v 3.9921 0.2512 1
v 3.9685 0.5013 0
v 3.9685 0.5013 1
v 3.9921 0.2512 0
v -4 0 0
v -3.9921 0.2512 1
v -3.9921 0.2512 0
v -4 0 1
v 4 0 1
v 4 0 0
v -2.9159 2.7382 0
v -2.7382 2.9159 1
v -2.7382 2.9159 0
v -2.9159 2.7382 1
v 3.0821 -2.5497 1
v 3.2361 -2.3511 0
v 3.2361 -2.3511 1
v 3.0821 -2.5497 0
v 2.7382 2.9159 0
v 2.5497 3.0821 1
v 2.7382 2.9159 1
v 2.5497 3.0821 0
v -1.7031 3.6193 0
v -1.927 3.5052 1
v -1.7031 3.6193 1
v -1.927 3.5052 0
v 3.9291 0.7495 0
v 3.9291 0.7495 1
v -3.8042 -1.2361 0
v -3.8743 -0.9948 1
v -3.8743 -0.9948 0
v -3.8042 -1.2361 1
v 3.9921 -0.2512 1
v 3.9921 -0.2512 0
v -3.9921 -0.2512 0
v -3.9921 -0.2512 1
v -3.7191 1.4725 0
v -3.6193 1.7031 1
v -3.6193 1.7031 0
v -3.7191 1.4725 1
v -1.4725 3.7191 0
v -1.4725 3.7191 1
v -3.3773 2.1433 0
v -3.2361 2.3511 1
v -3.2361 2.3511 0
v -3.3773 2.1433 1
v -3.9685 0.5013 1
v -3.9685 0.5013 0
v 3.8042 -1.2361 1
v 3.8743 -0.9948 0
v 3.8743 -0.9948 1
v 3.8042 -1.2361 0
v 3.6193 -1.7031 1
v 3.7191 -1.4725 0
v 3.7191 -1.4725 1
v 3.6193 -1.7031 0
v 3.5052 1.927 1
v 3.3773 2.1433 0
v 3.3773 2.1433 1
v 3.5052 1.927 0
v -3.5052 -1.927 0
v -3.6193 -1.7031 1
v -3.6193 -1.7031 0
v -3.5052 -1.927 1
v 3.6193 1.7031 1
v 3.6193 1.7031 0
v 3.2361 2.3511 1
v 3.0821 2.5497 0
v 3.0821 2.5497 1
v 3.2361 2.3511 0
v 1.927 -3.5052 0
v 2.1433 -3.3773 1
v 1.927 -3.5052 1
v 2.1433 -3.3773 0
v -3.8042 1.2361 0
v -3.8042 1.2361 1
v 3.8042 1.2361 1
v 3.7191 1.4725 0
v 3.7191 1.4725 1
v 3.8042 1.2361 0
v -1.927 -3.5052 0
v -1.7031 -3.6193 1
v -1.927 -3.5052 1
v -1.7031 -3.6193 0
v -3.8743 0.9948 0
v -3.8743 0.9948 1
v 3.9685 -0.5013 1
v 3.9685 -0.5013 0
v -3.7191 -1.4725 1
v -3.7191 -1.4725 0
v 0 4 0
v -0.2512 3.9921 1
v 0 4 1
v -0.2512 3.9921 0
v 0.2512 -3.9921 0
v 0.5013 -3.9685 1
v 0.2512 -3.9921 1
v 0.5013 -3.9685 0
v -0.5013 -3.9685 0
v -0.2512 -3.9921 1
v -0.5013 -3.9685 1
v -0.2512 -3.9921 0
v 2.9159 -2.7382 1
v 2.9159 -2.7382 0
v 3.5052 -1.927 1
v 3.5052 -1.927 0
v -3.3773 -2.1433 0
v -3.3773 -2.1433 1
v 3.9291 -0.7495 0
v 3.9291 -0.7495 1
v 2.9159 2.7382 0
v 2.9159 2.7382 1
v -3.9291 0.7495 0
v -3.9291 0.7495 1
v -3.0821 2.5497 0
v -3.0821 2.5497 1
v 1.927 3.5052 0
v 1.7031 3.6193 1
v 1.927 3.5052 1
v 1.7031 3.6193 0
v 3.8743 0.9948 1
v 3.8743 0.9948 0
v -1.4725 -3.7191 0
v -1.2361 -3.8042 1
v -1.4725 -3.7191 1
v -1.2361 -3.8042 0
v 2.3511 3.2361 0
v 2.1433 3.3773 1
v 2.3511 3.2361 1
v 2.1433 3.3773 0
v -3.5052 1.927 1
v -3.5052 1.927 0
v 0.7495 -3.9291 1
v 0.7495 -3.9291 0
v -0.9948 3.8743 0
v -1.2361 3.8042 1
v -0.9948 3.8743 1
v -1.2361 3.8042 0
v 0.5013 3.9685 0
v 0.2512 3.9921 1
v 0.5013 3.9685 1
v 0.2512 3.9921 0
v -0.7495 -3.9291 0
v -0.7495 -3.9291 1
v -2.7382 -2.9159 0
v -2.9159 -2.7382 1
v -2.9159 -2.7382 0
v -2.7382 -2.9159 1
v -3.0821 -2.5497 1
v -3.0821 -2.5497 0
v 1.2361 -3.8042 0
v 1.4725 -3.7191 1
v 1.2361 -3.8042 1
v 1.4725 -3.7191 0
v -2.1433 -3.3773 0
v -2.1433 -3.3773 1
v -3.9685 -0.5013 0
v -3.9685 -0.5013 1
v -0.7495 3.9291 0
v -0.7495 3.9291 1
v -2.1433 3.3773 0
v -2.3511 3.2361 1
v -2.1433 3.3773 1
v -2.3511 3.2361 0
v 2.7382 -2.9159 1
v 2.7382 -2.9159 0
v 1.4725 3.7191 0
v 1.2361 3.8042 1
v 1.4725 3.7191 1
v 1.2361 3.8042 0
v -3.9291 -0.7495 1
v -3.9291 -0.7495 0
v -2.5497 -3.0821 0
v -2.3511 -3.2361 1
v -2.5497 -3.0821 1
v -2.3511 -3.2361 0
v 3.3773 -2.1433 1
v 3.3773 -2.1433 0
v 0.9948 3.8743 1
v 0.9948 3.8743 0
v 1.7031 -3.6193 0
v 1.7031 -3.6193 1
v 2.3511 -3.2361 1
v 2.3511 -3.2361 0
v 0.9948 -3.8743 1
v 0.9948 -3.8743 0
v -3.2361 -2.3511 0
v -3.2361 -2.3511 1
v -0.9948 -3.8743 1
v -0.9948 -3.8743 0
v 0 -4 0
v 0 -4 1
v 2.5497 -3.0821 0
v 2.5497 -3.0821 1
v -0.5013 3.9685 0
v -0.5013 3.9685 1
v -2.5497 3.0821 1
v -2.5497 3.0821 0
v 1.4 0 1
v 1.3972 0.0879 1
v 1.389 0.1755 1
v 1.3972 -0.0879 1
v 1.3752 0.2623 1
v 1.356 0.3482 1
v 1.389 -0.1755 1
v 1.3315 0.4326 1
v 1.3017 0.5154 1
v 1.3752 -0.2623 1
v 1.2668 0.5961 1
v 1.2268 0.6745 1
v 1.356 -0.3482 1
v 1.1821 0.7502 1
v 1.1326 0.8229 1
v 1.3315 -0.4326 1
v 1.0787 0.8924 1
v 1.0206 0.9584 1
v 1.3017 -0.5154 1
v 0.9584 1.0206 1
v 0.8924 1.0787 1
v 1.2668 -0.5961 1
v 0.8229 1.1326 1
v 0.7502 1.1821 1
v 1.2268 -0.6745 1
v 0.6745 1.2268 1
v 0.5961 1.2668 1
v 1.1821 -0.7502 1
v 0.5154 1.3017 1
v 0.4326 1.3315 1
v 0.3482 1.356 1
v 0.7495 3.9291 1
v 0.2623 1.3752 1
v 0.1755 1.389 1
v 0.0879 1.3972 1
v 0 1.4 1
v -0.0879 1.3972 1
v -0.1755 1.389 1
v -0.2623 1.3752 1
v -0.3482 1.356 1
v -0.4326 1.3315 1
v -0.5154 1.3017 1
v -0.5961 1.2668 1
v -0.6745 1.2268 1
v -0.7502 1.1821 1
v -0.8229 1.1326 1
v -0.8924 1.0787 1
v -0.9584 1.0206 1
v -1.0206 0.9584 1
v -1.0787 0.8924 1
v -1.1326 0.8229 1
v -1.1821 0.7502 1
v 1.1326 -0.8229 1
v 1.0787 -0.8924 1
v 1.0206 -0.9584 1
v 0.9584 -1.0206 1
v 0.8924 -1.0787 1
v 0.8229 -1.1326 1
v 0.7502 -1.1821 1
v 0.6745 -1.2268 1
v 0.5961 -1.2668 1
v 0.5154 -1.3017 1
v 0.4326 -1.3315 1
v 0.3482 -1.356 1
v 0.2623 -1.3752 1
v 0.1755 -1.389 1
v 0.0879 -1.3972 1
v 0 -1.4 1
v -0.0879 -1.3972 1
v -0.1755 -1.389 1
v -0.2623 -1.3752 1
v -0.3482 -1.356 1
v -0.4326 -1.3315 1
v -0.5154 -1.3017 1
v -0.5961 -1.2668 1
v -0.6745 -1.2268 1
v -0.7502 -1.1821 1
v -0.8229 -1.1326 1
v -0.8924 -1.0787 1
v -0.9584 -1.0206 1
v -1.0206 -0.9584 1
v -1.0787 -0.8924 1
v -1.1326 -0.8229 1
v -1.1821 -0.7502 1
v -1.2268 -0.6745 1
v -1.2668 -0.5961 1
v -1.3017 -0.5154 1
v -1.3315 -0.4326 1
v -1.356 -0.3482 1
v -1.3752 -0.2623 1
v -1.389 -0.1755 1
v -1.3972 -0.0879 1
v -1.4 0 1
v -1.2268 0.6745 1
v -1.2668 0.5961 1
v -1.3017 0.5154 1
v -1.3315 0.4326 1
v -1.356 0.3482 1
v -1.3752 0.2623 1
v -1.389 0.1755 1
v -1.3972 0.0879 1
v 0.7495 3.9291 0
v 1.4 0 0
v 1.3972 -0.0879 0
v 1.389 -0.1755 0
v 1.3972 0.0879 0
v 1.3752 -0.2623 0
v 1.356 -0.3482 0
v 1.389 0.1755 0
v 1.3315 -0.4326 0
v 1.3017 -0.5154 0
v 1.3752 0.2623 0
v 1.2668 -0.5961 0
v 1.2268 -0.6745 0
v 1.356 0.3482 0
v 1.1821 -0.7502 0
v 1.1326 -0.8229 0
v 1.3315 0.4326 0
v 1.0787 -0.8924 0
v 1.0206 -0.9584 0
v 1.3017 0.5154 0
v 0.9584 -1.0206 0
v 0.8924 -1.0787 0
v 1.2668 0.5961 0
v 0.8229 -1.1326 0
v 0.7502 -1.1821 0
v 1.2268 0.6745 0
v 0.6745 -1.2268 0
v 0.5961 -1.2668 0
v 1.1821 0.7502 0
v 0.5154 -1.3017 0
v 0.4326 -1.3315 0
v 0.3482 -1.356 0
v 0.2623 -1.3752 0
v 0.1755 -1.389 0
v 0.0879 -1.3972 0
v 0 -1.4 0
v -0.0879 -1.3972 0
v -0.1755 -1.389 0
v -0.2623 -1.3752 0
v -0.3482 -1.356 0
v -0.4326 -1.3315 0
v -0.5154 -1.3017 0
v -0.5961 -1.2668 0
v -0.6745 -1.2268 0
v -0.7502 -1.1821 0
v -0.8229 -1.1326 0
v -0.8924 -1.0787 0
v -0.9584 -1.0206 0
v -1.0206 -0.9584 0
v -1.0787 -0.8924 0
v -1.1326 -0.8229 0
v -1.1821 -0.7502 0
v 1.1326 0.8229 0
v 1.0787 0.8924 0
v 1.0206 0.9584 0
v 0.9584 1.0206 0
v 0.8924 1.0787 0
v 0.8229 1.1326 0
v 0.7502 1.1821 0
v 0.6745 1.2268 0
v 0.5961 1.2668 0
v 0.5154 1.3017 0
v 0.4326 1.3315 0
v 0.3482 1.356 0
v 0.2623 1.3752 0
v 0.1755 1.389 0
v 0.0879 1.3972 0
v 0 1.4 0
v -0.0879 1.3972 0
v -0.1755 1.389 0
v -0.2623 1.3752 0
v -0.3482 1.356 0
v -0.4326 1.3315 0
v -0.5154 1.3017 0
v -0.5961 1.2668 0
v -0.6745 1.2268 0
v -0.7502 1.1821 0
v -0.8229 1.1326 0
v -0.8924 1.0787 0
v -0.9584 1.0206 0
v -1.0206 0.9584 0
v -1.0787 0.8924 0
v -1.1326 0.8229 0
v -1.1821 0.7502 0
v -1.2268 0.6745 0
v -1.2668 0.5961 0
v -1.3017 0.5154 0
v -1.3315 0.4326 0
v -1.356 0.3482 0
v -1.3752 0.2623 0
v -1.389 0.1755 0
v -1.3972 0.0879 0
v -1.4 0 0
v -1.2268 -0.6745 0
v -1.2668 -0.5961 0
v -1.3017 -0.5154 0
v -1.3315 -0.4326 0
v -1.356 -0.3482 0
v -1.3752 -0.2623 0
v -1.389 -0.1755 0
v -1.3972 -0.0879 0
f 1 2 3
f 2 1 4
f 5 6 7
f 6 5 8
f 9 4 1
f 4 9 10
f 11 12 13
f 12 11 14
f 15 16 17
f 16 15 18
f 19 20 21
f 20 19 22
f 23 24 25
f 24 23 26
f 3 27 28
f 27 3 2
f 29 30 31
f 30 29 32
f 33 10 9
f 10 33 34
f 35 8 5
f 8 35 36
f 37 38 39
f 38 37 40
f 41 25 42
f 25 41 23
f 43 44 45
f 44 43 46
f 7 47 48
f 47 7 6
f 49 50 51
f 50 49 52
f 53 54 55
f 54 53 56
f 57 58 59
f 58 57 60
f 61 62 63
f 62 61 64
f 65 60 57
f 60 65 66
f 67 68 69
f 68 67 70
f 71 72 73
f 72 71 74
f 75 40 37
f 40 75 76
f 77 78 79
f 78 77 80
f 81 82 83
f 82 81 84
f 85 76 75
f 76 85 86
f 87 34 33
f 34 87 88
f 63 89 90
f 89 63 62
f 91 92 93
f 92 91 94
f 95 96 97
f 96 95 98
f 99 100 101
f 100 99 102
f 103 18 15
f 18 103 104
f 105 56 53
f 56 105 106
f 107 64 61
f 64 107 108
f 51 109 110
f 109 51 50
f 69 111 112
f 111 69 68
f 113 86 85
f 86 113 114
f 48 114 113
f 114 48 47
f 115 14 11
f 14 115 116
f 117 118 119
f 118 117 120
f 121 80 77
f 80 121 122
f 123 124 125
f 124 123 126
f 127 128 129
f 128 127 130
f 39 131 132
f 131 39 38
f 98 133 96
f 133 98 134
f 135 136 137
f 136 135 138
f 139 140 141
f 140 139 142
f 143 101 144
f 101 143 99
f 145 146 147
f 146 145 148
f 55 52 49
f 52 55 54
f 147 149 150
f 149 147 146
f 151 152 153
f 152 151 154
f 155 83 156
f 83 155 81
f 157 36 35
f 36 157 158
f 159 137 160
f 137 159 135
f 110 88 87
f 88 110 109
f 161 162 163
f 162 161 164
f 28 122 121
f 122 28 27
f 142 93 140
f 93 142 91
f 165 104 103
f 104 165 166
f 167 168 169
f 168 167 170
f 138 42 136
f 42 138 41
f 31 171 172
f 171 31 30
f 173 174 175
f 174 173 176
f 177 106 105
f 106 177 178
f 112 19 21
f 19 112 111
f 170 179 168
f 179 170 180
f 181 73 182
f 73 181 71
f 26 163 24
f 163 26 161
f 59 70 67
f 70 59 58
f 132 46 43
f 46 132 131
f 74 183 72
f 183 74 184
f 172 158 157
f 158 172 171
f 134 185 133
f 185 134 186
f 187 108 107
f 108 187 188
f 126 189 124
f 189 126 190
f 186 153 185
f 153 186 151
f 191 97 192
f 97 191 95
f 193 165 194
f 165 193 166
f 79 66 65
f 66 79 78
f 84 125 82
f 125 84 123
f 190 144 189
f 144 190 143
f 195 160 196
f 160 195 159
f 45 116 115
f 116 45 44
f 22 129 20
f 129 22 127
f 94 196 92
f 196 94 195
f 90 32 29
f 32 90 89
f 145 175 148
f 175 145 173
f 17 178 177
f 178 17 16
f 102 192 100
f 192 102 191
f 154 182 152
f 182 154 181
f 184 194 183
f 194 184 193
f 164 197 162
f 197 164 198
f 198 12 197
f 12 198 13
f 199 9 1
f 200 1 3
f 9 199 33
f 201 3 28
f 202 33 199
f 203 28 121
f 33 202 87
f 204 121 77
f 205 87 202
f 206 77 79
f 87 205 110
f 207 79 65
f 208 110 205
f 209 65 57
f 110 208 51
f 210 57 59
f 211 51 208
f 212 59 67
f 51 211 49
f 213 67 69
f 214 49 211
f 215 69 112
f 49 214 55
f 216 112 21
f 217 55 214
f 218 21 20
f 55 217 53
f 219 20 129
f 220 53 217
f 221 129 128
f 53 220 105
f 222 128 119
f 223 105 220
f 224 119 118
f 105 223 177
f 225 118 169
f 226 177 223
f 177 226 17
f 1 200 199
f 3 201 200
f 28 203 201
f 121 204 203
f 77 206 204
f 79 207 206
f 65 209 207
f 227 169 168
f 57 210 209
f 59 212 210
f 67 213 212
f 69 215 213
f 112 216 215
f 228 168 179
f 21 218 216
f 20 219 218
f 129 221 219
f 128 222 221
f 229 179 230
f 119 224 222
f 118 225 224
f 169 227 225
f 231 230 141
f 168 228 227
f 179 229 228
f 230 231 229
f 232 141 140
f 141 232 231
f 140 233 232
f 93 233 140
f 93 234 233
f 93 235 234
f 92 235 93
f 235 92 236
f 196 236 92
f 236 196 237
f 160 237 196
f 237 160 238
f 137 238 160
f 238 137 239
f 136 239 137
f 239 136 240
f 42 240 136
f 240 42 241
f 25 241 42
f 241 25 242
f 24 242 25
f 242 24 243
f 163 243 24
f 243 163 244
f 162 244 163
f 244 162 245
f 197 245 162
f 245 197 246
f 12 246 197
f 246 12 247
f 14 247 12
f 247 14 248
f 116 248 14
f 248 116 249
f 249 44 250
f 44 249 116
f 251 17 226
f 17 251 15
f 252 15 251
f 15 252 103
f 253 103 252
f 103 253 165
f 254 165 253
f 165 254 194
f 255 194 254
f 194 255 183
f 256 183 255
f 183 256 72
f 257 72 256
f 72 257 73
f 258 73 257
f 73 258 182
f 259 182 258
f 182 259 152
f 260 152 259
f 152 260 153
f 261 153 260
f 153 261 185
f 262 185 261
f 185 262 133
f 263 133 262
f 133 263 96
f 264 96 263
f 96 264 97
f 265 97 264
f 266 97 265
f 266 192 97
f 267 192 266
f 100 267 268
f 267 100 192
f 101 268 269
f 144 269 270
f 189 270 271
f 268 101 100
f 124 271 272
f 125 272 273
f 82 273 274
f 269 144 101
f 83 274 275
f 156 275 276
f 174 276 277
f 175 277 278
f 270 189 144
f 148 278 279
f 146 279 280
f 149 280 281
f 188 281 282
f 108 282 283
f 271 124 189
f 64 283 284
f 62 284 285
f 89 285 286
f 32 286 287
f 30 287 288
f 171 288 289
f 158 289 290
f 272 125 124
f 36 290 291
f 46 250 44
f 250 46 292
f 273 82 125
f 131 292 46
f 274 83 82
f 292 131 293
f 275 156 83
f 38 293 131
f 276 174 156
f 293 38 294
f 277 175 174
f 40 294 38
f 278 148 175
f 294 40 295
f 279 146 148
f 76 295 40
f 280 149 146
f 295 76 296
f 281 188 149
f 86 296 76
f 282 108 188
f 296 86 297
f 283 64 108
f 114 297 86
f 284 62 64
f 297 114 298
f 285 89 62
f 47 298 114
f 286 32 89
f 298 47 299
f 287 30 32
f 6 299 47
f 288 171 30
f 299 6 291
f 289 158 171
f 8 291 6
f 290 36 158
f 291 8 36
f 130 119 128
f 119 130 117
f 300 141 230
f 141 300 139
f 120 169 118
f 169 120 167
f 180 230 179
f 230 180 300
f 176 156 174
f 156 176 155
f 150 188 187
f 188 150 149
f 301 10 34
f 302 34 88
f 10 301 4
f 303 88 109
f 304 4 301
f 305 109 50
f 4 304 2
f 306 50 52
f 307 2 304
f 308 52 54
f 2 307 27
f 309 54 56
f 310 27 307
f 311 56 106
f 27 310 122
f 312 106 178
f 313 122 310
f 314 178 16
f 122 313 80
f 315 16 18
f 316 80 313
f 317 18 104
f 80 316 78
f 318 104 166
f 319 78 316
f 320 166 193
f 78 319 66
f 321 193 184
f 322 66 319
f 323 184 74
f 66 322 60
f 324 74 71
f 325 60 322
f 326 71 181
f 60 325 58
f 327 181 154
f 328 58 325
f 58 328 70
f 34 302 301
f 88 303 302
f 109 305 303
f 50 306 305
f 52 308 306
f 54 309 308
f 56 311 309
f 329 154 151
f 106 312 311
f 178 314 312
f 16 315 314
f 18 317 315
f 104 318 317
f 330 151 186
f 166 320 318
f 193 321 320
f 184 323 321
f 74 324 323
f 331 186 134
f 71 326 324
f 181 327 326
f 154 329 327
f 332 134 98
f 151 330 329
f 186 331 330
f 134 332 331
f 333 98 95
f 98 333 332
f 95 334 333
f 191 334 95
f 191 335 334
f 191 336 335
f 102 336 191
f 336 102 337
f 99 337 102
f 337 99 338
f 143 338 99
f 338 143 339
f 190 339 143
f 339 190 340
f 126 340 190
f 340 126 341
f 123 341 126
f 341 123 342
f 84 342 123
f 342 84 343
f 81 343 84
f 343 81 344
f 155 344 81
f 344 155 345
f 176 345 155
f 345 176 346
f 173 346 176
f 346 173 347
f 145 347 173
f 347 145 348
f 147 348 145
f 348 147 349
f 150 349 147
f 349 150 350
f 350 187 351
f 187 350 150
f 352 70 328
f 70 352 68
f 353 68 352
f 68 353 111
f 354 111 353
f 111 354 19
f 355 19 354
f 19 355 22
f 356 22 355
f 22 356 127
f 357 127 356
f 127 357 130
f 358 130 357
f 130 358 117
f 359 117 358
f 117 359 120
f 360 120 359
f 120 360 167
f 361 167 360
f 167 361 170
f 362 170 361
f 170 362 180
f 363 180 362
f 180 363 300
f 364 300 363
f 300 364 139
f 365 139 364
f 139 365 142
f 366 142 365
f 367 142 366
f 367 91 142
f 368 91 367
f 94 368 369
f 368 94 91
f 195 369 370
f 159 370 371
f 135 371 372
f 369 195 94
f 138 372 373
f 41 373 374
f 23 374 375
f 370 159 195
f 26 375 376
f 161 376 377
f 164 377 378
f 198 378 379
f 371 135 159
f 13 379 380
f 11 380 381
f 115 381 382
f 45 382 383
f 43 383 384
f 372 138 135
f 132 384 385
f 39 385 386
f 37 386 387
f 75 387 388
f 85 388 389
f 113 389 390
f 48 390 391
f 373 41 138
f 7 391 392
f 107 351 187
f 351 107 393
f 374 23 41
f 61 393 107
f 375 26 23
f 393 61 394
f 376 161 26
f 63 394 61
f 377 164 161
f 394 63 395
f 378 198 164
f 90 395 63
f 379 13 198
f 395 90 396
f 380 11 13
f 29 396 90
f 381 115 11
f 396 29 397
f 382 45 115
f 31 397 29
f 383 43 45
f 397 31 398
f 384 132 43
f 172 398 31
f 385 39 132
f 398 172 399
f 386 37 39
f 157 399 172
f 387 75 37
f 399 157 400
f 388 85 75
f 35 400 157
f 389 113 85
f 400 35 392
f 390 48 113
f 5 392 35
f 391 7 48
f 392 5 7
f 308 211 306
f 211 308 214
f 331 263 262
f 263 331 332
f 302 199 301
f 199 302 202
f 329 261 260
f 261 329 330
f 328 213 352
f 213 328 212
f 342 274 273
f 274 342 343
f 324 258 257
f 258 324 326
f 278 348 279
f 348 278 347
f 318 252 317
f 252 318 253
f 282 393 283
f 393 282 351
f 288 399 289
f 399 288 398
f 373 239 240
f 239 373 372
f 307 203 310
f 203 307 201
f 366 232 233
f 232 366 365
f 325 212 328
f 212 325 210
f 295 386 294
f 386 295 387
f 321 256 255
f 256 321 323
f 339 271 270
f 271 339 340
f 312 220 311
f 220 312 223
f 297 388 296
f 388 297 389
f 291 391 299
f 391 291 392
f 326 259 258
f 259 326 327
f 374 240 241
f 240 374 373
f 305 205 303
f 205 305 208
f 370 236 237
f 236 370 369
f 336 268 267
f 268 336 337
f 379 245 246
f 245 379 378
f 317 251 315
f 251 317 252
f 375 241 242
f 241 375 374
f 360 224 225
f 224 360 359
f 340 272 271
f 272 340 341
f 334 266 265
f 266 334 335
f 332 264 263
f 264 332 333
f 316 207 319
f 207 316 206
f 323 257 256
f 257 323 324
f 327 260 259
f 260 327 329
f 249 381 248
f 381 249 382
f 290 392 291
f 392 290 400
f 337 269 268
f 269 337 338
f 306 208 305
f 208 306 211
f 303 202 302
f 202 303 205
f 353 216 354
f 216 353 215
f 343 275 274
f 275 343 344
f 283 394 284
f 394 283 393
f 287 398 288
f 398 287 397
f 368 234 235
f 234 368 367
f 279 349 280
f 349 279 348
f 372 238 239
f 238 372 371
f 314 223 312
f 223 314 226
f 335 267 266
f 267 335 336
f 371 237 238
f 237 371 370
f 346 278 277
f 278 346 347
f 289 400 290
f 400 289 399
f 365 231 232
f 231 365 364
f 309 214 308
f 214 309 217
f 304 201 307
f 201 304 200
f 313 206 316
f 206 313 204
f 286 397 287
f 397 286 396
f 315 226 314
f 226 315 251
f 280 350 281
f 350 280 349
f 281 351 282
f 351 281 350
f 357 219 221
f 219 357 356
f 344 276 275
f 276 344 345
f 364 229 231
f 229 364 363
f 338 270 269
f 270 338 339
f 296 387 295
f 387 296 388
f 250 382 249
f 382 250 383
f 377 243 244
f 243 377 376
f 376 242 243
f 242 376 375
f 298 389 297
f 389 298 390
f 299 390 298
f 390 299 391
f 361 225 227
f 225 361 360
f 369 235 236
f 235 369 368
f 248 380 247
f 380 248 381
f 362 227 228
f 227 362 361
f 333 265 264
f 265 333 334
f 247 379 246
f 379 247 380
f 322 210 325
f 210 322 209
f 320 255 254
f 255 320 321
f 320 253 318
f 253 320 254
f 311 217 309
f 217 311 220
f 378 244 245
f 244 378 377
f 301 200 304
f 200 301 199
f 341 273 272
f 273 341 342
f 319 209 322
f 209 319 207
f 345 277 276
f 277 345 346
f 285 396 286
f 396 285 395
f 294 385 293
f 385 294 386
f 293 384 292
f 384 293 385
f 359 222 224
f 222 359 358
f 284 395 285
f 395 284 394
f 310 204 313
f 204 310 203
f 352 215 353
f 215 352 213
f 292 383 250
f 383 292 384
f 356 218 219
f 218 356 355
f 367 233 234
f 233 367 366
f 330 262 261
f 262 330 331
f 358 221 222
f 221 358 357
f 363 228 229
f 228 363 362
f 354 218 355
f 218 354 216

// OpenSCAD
$fn=100;
eps=.1;

difference() {
    linear_extrude(1) circle(4);
    translate([0,0,-eps/2]) linear_extrude(1+eps) circle(1.4);
}
